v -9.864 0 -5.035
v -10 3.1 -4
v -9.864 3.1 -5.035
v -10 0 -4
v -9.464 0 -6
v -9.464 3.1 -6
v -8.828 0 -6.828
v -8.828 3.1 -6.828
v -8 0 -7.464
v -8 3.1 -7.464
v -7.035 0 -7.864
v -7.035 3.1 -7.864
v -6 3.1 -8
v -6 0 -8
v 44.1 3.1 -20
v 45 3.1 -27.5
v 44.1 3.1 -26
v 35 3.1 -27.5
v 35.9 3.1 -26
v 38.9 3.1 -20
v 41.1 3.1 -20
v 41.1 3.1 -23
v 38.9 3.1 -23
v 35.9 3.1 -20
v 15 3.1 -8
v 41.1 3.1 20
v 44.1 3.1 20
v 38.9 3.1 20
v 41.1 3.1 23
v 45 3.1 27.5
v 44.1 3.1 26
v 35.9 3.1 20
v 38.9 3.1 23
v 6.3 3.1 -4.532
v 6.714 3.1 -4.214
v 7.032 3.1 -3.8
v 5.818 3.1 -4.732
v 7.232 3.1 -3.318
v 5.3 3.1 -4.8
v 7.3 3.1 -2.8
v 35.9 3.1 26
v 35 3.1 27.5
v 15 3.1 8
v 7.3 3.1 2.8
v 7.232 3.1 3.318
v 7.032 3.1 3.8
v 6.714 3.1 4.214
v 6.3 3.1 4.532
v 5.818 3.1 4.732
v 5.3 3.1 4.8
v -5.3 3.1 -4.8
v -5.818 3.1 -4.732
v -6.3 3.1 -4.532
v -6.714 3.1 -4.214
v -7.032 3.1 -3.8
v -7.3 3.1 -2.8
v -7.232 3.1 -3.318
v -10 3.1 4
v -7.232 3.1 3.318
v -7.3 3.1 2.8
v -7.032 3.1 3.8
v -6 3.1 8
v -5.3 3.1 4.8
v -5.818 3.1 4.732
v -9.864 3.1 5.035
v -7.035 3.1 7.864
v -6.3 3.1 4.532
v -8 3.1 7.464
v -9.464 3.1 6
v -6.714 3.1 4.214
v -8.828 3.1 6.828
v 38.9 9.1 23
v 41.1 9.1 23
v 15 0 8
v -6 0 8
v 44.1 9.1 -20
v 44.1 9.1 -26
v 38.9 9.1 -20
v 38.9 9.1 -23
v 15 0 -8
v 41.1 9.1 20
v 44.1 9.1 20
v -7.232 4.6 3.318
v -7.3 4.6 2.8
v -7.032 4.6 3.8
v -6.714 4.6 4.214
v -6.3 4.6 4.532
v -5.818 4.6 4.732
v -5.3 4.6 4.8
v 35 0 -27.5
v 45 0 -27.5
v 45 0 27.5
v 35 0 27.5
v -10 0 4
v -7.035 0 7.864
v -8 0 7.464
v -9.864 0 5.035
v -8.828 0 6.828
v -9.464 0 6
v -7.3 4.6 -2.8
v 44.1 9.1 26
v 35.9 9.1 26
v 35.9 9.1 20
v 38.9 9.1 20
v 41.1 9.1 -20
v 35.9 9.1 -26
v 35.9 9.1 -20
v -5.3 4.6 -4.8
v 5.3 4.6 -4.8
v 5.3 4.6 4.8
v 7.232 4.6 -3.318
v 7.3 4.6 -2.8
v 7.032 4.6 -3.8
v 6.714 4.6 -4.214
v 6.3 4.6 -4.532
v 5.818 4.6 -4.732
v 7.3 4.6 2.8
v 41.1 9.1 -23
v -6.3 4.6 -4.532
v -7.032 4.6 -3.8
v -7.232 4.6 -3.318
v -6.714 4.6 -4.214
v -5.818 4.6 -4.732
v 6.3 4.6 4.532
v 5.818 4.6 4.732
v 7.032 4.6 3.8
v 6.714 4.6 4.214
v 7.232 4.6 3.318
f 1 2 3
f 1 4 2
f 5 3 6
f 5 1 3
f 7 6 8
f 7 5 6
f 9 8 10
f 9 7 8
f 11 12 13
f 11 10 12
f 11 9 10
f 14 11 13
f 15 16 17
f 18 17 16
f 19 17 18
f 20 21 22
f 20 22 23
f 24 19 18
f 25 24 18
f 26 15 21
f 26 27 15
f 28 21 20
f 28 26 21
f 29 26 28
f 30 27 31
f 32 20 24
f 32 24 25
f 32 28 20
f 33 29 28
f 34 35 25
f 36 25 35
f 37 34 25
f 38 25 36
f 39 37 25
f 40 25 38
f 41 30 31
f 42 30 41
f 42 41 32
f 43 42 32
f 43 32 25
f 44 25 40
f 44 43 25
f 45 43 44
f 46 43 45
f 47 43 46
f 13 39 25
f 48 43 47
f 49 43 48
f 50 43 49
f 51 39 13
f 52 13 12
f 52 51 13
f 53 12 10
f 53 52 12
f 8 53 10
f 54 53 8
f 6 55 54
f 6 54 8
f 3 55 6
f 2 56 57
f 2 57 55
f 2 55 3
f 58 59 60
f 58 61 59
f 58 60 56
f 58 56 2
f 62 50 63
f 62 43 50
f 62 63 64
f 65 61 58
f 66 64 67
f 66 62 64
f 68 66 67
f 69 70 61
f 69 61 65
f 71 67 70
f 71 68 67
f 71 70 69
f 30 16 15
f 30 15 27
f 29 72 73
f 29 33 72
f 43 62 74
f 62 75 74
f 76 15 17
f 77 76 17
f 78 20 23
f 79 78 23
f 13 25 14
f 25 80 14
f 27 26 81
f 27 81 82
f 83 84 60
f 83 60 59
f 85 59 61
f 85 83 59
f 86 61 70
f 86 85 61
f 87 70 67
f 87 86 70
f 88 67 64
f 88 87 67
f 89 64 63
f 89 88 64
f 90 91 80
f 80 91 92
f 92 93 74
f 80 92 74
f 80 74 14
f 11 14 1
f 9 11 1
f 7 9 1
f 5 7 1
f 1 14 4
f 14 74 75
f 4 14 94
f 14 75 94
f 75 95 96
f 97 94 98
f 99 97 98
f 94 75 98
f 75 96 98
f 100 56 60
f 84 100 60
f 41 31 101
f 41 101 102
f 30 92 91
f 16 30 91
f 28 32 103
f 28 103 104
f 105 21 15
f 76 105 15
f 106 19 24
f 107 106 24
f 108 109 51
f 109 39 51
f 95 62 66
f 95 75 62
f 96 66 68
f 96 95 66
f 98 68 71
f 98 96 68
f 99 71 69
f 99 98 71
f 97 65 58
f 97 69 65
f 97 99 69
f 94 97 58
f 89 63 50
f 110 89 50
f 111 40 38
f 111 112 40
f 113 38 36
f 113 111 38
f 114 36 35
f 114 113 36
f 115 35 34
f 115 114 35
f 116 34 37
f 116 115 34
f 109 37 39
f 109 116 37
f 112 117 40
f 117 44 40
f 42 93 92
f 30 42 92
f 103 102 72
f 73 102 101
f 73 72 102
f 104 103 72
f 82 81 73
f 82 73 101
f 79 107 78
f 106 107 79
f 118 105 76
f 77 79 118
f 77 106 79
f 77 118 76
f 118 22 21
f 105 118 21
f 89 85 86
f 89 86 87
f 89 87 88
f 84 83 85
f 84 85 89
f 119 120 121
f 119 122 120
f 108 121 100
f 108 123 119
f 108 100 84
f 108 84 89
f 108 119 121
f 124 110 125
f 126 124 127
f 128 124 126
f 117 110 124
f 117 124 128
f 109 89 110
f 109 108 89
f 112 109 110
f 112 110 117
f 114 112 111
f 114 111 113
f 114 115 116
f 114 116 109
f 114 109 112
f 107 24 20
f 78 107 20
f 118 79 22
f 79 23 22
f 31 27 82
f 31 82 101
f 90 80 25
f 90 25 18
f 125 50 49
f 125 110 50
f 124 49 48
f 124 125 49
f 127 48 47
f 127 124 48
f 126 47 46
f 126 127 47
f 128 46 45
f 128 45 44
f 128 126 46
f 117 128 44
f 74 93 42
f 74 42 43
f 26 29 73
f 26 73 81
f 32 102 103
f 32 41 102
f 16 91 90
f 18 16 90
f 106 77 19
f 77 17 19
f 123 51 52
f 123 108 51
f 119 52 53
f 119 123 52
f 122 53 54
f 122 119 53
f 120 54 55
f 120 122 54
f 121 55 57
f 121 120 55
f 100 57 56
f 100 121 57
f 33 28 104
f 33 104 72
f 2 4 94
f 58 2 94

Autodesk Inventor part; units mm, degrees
ref_plane "YZ Plane" through (0, 0, 0) normal (1, 0, 0) x (0, 1, 0)
ref_plane "XZ Plane" through (0, 0, 0) normal (0, 1, 0) x (-1, 0, 0)
ref_plane "XY Plane" through (0, 0, 0) normal (0, 0, 1) x (1, 0, 0)
sketch "Sketch1" plane through (0, 0, 0) normal (0, 1, 0) x (-1, 0, 0)
  line L0 (6, 8) -> (-15, 8)
  line L1 (-15, -8) -> (6, -8)
  line L2 (10, -4) -> (10, 4)
  line L3 (-45, 0) -> (10, 0) construction
  arc A0 (10, 4) -> (6, 8) centre (6, 4) ccw
  arc A1 (6, -8) -> (10, -4) centre (6, -4) ccw
  line L4 (-35, 27.5) -> (-15, 8)
  line L5 (-15, -8) -> (-35, -27.5)
  line L6 (-35, 27.5) -> (-45, 27.5)
  line L7 (-45, 27.5) -> (-45, -27.5)
  line L8 (-45, -27.5) -> (-35, -27.5)
  point P0 (0, 0)
  point P1 (10, 8)
  point P2 (10, -8)
  dimension "d1" = 16
  dimension "d3" = 10
  dimension "d4" = 4
  dimension "d16" = 20
  dimension "d17" = 10
  dimension "d18" = 55
  dimension "d26" = 25
extrude "Extrusion1" add sketch "Sketch1" along normal blind 3.1
sketch "Sketch2" plane through (0, 3.1, 0) normal (0, 1, 0) x (1, 0, 0)
  line L0 (-7.3, -4.8) -> (7.3, -4.8)
  line L1 (7.3, -4.8) -> (7.3, 4.8)
  line L2 (7.3, 4.8) -> (-7.3, 4.8)
  line L3 (-7.3, 4.8) -> (-7.3, -4.8)
  line L4 (-7.3, -4.8) -> (7.3, 4.8) construction
  line L5 (7.3, -4.8) -> (-7.3, 4.8) construction
  point P0 (0, 0)
  dimension "d7" = 15
  dimension "d8" = 10
extrude "Extrusion2" add sketch "Sketch2" along normal blind 1.5
fillet "Fillet1" radius 2 4 edges at (7.3, 3.85, -4.8) (7.3, 3.85, 4.8) (-7.3, 3.85, 4.8) (-7.3, 3.85, -4.8)
sketch "Sketch3" plane through (0, 3.1, 0) normal (0, 1, 0) x (1, 0, 0)
  line L0 (-10, 4) -> (-10, -4) projected
  line L1 (35, -27.5) -> (45, -27.5) projected
  line L2 (45, -27.5) -> (45, 27.5) projected
  line L3 (15, 8) -> (-6, 8) projected
  line L4 (35.9, 20) -> (38.9, 20)
  line L5 (38.9, 20) -> (38.9, 23)
  line L6 (38.9, 23) -> (41.1, 23)
  line L7 (41.1, 23) -> (41.1, 20)
  line L8 (41.1, 20) -> (44.1, 20)
  line L9 (44.1, 20) -> (44.1, 26)
  line L10 (44.1, 26) -> (35.9, 26)
  line L11 (35.9, 26) -> (35.9, 20)
  line L12 (45, 0) -> (-10, 0) construction
  line L13 (35.9, -20) -> (38.9, -20)
  line L14 (38.9, -20) -> (38.9, -23)
  line L15 (38.9, -23) -> (41.1, -23)
  line L16 (41.1, -23) -> (41.1, -20)
  line L17 (41.1, -20) -> (44.1, -20)
  line L18 (44.1, -20) -> (44.1, -26)
  line L19 (44.1, -26) -> (35.9, -26)
  line L20 (35.9, -26) -> (35.9, -20)
  line L21 (35, 27.5) -> (35, -27.5) construction
  line L22 (45, 27.5) -> (35, 27.5) projected
  line L23 (40, -27.5) -> (40, 27.5) construction
  point P0 (0, 0)
  point P1 (40, 26)
  dimension "d19" = 3
  dimension "d20" = 3
  dimension "d21" = 1.6
  dimension "d22" = 45.4
extrude "Extrusion3" add sketch "Sketch3" along normal blind 6
equation "\"d20\" = d19"
properties part number "Front Sensor Holder"
